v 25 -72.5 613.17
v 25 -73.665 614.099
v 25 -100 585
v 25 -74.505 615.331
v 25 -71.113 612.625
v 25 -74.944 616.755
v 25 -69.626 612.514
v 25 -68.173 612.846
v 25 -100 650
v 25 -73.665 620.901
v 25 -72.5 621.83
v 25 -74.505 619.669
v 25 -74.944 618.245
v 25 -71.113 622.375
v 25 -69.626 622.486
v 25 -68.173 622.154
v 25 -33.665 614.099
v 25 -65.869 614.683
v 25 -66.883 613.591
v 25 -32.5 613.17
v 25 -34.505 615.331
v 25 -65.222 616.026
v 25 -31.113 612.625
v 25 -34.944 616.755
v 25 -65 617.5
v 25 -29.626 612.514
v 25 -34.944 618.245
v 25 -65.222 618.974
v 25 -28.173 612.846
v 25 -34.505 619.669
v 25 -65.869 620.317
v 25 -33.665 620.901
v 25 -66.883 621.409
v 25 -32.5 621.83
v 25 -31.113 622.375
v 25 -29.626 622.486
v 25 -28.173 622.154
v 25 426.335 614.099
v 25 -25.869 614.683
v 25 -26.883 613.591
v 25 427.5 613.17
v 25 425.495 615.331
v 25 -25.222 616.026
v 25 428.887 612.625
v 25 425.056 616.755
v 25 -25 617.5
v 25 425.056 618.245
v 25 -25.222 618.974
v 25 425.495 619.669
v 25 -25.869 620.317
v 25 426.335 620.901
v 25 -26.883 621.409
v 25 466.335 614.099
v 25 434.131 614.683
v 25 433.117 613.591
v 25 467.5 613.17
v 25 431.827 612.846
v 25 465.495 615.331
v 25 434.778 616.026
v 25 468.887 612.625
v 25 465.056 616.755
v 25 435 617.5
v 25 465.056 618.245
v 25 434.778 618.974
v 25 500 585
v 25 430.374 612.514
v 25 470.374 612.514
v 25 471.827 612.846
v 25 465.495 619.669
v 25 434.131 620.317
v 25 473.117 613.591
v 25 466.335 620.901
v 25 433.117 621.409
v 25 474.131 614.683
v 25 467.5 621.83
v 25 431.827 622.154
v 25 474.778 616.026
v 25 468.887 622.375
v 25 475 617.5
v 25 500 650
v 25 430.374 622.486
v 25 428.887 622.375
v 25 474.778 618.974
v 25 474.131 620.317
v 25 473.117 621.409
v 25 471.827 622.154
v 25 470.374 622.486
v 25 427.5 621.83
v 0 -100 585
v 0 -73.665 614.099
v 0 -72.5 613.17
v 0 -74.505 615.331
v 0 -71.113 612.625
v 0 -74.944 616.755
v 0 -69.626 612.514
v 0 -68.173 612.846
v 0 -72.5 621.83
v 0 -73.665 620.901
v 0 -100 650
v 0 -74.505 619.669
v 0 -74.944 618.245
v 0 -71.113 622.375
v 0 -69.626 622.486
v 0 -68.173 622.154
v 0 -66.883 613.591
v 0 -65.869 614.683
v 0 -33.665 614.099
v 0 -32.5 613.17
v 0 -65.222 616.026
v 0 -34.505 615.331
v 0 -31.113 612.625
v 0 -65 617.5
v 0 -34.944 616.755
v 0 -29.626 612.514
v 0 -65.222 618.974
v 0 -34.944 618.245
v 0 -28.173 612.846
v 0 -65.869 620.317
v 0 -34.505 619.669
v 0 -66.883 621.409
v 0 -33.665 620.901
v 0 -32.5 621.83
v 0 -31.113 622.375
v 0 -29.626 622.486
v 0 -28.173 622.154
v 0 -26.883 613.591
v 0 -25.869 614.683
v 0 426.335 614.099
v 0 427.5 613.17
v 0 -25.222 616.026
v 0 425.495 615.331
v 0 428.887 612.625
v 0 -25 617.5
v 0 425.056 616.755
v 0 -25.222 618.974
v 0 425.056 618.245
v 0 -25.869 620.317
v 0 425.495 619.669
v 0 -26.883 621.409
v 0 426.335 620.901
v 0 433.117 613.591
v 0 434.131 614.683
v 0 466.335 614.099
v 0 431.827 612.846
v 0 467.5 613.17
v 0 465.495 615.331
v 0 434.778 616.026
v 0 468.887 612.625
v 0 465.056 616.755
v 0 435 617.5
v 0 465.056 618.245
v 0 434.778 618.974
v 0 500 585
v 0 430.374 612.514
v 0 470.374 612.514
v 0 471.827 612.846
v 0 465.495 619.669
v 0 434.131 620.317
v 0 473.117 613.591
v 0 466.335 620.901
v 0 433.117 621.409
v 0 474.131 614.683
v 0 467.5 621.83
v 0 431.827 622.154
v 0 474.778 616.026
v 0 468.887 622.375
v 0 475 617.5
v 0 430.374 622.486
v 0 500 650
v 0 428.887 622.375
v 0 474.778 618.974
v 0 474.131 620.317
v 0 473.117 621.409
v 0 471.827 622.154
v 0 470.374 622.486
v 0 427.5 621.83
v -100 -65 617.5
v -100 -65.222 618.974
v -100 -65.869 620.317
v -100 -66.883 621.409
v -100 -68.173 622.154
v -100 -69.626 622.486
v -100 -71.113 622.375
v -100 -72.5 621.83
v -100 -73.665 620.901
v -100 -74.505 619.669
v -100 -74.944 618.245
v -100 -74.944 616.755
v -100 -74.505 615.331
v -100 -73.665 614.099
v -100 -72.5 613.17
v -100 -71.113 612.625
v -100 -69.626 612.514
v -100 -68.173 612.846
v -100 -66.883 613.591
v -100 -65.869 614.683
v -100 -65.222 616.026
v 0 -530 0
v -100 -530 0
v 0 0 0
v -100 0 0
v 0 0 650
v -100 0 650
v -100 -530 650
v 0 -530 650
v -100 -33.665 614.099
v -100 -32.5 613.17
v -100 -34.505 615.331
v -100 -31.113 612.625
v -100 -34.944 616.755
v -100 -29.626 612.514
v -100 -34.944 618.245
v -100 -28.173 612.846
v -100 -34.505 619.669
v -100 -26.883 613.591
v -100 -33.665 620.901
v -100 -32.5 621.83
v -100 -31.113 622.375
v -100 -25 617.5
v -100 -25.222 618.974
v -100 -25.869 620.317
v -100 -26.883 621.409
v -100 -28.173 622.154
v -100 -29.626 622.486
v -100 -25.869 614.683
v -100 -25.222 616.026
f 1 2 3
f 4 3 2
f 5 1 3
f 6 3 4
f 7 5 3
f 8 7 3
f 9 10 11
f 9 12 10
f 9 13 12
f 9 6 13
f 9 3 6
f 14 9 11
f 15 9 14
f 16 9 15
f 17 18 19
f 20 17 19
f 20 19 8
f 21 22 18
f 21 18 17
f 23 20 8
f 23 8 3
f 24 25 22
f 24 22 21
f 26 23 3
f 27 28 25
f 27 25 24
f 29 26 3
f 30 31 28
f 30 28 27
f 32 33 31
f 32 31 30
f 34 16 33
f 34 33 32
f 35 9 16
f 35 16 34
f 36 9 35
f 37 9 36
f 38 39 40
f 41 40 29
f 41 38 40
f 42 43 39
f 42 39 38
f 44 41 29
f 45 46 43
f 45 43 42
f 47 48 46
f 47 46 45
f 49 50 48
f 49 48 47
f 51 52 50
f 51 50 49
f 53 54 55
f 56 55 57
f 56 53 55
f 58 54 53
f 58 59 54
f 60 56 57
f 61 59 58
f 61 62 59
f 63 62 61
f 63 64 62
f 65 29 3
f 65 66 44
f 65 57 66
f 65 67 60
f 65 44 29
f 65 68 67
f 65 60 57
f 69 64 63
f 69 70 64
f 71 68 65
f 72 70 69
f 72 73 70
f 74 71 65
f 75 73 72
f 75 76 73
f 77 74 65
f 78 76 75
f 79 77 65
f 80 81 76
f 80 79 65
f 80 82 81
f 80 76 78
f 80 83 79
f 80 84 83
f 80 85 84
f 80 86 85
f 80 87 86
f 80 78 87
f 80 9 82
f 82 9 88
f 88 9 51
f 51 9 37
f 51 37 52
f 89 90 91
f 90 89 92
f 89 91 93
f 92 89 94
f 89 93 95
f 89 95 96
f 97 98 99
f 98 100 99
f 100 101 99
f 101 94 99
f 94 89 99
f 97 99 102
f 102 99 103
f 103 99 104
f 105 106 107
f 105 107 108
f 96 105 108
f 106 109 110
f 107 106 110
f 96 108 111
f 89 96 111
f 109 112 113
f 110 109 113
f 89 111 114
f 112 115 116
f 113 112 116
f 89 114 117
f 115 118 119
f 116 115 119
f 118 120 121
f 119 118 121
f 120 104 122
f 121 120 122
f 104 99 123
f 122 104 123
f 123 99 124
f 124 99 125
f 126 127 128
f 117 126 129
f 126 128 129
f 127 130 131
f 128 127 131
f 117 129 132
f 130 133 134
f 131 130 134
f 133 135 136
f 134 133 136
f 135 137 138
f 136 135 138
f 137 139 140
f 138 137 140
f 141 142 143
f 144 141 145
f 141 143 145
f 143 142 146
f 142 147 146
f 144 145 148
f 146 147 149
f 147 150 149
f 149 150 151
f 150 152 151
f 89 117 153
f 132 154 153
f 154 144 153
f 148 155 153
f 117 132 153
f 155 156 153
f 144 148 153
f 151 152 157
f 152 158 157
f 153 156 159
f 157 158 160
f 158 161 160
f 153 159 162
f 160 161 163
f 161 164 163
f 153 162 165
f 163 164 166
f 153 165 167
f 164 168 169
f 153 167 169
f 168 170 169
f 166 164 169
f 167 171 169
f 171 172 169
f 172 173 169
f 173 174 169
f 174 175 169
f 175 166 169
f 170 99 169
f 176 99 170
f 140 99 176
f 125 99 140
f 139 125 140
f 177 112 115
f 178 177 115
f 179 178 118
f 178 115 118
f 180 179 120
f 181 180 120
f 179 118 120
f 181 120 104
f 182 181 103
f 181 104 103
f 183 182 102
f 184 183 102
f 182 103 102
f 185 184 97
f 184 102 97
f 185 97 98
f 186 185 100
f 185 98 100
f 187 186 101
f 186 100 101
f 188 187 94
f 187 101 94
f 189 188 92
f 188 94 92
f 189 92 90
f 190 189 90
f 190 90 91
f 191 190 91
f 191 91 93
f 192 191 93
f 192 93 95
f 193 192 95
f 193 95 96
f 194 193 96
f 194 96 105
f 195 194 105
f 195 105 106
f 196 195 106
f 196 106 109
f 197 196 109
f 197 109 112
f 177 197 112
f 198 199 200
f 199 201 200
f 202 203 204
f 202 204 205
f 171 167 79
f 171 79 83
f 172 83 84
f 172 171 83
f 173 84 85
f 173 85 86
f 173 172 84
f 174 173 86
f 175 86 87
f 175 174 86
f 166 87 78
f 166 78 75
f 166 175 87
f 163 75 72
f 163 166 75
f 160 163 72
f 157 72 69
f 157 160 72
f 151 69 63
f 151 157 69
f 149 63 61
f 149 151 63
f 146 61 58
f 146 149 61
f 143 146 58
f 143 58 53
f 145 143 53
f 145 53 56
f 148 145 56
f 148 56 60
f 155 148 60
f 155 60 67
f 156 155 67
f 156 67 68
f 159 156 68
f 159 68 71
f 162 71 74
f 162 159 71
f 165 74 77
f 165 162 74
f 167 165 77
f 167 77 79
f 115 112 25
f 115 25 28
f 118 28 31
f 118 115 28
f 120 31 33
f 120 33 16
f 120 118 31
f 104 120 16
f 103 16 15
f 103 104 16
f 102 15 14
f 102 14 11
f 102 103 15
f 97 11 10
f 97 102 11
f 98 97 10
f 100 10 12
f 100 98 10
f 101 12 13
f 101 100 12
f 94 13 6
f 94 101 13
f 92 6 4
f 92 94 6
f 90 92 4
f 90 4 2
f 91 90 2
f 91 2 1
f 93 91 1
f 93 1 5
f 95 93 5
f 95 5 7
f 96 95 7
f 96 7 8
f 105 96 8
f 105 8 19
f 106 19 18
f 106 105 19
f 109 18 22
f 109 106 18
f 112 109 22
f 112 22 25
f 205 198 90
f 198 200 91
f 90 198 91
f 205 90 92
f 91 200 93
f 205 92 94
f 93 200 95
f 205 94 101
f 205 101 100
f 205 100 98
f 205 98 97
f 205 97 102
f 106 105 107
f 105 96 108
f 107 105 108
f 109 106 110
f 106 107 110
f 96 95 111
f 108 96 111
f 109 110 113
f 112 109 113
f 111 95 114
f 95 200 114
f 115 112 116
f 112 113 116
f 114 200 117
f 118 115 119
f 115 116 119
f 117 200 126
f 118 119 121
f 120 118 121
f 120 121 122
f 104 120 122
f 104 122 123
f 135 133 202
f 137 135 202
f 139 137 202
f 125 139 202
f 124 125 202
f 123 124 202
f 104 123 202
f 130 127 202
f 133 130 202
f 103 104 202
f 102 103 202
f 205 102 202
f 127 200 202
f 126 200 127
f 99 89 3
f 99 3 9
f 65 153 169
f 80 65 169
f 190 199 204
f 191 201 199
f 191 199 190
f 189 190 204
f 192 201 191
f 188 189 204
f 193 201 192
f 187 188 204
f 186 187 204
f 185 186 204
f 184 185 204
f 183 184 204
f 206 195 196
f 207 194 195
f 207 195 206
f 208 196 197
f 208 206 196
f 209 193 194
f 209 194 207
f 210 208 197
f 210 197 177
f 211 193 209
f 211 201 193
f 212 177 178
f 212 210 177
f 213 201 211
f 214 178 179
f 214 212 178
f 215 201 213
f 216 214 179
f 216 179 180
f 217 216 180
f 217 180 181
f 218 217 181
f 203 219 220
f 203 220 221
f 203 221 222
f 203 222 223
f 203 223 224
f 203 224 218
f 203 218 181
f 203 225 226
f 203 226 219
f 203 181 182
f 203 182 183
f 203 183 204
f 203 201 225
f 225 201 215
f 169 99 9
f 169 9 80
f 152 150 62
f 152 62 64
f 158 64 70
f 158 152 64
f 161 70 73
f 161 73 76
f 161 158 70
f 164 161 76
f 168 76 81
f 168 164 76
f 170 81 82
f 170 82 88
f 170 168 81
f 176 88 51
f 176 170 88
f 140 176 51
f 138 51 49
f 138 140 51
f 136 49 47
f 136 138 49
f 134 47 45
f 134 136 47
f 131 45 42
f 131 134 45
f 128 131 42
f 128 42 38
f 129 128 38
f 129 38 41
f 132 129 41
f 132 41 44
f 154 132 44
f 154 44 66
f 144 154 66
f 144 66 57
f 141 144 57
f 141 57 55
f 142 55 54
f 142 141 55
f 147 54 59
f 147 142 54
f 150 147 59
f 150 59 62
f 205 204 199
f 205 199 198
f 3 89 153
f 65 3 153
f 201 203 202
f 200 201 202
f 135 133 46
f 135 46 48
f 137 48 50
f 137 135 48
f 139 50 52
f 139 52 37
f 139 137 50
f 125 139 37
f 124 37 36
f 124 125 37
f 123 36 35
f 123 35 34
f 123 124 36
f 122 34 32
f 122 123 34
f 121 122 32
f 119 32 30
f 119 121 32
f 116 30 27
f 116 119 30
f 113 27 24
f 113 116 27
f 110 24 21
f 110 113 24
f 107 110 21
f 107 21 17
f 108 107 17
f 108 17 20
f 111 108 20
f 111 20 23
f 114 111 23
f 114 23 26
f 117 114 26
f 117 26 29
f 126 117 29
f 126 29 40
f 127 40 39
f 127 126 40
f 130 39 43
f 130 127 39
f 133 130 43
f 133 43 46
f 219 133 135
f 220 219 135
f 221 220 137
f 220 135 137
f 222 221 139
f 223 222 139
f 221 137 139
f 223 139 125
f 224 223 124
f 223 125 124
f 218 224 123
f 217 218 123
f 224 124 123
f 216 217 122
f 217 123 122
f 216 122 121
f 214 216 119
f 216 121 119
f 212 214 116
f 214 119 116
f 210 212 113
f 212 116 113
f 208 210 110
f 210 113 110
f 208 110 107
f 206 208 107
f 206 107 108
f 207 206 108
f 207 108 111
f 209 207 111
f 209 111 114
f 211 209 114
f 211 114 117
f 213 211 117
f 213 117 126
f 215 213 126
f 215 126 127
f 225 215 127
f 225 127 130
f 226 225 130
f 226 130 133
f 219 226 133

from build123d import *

# Parameters (mm, degrees)
F0_W     = 100
F0_H     = 100
F1_DEPTH = 650
F2_R     = 5
F3_DEPTH = 100.001
F4_W     = 600
F4_H     = 65
F4_R     = 5
F5_DEPTH = 25
F6_DEPTH = 430


with BuildPart() as f1:
    # F0 (on Top) → F1 (new body)
    with BuildSketch(Plane.XY):
        with Locations((-50, -50)):
            Rectangle(F0_W, F0_H)
    extrude(amount=F1_DEPTH)

    # F2 (on face) → F3 (cut, through all)
    with BuildSketch(Plane.YZ):
        with Locations((-70, 617.5)):
            Circle(F2_R)
        with Locations((-30, 617.5)):
            Circle(F2_R)
    extrude(amount=-F3_DEPTH, mode=Mode.SUBTRACT)

    # F6 (add): a face of the model
    f6_faces = [f1.faces().sort_by_distance(p)[0] for p in [
        (-50, -100, 325),
    ]]
    extrude(f6_faces, amount=F6_DEPTH)


with BuildPart() as f5:
    # F4 (on Right) → F5 (new body)
    with BuildSketch(Plane.YZ):
        with Locations((200, 617.5)):
            Rectangle(F4_W, F4_H)
        with Locations((-70, 617.5)):
            Circle(F4_R, mode=Mode.SUBTRACT)
        with Locations((-30, 617.5)):
            Circle(F4_R, mode=Mode.SUBTRACT)
        with Locations((430, 617.5)):
            Circle(F4_R, mode=Mode.SUBTRACT)
        with Locations((470, 617.5)):
            Circle(F4_R, mode=Mode.SUBTRACT)
    extrude(amount=F5_DEPTH)


solid = Compound([f1.part, f5.part])
